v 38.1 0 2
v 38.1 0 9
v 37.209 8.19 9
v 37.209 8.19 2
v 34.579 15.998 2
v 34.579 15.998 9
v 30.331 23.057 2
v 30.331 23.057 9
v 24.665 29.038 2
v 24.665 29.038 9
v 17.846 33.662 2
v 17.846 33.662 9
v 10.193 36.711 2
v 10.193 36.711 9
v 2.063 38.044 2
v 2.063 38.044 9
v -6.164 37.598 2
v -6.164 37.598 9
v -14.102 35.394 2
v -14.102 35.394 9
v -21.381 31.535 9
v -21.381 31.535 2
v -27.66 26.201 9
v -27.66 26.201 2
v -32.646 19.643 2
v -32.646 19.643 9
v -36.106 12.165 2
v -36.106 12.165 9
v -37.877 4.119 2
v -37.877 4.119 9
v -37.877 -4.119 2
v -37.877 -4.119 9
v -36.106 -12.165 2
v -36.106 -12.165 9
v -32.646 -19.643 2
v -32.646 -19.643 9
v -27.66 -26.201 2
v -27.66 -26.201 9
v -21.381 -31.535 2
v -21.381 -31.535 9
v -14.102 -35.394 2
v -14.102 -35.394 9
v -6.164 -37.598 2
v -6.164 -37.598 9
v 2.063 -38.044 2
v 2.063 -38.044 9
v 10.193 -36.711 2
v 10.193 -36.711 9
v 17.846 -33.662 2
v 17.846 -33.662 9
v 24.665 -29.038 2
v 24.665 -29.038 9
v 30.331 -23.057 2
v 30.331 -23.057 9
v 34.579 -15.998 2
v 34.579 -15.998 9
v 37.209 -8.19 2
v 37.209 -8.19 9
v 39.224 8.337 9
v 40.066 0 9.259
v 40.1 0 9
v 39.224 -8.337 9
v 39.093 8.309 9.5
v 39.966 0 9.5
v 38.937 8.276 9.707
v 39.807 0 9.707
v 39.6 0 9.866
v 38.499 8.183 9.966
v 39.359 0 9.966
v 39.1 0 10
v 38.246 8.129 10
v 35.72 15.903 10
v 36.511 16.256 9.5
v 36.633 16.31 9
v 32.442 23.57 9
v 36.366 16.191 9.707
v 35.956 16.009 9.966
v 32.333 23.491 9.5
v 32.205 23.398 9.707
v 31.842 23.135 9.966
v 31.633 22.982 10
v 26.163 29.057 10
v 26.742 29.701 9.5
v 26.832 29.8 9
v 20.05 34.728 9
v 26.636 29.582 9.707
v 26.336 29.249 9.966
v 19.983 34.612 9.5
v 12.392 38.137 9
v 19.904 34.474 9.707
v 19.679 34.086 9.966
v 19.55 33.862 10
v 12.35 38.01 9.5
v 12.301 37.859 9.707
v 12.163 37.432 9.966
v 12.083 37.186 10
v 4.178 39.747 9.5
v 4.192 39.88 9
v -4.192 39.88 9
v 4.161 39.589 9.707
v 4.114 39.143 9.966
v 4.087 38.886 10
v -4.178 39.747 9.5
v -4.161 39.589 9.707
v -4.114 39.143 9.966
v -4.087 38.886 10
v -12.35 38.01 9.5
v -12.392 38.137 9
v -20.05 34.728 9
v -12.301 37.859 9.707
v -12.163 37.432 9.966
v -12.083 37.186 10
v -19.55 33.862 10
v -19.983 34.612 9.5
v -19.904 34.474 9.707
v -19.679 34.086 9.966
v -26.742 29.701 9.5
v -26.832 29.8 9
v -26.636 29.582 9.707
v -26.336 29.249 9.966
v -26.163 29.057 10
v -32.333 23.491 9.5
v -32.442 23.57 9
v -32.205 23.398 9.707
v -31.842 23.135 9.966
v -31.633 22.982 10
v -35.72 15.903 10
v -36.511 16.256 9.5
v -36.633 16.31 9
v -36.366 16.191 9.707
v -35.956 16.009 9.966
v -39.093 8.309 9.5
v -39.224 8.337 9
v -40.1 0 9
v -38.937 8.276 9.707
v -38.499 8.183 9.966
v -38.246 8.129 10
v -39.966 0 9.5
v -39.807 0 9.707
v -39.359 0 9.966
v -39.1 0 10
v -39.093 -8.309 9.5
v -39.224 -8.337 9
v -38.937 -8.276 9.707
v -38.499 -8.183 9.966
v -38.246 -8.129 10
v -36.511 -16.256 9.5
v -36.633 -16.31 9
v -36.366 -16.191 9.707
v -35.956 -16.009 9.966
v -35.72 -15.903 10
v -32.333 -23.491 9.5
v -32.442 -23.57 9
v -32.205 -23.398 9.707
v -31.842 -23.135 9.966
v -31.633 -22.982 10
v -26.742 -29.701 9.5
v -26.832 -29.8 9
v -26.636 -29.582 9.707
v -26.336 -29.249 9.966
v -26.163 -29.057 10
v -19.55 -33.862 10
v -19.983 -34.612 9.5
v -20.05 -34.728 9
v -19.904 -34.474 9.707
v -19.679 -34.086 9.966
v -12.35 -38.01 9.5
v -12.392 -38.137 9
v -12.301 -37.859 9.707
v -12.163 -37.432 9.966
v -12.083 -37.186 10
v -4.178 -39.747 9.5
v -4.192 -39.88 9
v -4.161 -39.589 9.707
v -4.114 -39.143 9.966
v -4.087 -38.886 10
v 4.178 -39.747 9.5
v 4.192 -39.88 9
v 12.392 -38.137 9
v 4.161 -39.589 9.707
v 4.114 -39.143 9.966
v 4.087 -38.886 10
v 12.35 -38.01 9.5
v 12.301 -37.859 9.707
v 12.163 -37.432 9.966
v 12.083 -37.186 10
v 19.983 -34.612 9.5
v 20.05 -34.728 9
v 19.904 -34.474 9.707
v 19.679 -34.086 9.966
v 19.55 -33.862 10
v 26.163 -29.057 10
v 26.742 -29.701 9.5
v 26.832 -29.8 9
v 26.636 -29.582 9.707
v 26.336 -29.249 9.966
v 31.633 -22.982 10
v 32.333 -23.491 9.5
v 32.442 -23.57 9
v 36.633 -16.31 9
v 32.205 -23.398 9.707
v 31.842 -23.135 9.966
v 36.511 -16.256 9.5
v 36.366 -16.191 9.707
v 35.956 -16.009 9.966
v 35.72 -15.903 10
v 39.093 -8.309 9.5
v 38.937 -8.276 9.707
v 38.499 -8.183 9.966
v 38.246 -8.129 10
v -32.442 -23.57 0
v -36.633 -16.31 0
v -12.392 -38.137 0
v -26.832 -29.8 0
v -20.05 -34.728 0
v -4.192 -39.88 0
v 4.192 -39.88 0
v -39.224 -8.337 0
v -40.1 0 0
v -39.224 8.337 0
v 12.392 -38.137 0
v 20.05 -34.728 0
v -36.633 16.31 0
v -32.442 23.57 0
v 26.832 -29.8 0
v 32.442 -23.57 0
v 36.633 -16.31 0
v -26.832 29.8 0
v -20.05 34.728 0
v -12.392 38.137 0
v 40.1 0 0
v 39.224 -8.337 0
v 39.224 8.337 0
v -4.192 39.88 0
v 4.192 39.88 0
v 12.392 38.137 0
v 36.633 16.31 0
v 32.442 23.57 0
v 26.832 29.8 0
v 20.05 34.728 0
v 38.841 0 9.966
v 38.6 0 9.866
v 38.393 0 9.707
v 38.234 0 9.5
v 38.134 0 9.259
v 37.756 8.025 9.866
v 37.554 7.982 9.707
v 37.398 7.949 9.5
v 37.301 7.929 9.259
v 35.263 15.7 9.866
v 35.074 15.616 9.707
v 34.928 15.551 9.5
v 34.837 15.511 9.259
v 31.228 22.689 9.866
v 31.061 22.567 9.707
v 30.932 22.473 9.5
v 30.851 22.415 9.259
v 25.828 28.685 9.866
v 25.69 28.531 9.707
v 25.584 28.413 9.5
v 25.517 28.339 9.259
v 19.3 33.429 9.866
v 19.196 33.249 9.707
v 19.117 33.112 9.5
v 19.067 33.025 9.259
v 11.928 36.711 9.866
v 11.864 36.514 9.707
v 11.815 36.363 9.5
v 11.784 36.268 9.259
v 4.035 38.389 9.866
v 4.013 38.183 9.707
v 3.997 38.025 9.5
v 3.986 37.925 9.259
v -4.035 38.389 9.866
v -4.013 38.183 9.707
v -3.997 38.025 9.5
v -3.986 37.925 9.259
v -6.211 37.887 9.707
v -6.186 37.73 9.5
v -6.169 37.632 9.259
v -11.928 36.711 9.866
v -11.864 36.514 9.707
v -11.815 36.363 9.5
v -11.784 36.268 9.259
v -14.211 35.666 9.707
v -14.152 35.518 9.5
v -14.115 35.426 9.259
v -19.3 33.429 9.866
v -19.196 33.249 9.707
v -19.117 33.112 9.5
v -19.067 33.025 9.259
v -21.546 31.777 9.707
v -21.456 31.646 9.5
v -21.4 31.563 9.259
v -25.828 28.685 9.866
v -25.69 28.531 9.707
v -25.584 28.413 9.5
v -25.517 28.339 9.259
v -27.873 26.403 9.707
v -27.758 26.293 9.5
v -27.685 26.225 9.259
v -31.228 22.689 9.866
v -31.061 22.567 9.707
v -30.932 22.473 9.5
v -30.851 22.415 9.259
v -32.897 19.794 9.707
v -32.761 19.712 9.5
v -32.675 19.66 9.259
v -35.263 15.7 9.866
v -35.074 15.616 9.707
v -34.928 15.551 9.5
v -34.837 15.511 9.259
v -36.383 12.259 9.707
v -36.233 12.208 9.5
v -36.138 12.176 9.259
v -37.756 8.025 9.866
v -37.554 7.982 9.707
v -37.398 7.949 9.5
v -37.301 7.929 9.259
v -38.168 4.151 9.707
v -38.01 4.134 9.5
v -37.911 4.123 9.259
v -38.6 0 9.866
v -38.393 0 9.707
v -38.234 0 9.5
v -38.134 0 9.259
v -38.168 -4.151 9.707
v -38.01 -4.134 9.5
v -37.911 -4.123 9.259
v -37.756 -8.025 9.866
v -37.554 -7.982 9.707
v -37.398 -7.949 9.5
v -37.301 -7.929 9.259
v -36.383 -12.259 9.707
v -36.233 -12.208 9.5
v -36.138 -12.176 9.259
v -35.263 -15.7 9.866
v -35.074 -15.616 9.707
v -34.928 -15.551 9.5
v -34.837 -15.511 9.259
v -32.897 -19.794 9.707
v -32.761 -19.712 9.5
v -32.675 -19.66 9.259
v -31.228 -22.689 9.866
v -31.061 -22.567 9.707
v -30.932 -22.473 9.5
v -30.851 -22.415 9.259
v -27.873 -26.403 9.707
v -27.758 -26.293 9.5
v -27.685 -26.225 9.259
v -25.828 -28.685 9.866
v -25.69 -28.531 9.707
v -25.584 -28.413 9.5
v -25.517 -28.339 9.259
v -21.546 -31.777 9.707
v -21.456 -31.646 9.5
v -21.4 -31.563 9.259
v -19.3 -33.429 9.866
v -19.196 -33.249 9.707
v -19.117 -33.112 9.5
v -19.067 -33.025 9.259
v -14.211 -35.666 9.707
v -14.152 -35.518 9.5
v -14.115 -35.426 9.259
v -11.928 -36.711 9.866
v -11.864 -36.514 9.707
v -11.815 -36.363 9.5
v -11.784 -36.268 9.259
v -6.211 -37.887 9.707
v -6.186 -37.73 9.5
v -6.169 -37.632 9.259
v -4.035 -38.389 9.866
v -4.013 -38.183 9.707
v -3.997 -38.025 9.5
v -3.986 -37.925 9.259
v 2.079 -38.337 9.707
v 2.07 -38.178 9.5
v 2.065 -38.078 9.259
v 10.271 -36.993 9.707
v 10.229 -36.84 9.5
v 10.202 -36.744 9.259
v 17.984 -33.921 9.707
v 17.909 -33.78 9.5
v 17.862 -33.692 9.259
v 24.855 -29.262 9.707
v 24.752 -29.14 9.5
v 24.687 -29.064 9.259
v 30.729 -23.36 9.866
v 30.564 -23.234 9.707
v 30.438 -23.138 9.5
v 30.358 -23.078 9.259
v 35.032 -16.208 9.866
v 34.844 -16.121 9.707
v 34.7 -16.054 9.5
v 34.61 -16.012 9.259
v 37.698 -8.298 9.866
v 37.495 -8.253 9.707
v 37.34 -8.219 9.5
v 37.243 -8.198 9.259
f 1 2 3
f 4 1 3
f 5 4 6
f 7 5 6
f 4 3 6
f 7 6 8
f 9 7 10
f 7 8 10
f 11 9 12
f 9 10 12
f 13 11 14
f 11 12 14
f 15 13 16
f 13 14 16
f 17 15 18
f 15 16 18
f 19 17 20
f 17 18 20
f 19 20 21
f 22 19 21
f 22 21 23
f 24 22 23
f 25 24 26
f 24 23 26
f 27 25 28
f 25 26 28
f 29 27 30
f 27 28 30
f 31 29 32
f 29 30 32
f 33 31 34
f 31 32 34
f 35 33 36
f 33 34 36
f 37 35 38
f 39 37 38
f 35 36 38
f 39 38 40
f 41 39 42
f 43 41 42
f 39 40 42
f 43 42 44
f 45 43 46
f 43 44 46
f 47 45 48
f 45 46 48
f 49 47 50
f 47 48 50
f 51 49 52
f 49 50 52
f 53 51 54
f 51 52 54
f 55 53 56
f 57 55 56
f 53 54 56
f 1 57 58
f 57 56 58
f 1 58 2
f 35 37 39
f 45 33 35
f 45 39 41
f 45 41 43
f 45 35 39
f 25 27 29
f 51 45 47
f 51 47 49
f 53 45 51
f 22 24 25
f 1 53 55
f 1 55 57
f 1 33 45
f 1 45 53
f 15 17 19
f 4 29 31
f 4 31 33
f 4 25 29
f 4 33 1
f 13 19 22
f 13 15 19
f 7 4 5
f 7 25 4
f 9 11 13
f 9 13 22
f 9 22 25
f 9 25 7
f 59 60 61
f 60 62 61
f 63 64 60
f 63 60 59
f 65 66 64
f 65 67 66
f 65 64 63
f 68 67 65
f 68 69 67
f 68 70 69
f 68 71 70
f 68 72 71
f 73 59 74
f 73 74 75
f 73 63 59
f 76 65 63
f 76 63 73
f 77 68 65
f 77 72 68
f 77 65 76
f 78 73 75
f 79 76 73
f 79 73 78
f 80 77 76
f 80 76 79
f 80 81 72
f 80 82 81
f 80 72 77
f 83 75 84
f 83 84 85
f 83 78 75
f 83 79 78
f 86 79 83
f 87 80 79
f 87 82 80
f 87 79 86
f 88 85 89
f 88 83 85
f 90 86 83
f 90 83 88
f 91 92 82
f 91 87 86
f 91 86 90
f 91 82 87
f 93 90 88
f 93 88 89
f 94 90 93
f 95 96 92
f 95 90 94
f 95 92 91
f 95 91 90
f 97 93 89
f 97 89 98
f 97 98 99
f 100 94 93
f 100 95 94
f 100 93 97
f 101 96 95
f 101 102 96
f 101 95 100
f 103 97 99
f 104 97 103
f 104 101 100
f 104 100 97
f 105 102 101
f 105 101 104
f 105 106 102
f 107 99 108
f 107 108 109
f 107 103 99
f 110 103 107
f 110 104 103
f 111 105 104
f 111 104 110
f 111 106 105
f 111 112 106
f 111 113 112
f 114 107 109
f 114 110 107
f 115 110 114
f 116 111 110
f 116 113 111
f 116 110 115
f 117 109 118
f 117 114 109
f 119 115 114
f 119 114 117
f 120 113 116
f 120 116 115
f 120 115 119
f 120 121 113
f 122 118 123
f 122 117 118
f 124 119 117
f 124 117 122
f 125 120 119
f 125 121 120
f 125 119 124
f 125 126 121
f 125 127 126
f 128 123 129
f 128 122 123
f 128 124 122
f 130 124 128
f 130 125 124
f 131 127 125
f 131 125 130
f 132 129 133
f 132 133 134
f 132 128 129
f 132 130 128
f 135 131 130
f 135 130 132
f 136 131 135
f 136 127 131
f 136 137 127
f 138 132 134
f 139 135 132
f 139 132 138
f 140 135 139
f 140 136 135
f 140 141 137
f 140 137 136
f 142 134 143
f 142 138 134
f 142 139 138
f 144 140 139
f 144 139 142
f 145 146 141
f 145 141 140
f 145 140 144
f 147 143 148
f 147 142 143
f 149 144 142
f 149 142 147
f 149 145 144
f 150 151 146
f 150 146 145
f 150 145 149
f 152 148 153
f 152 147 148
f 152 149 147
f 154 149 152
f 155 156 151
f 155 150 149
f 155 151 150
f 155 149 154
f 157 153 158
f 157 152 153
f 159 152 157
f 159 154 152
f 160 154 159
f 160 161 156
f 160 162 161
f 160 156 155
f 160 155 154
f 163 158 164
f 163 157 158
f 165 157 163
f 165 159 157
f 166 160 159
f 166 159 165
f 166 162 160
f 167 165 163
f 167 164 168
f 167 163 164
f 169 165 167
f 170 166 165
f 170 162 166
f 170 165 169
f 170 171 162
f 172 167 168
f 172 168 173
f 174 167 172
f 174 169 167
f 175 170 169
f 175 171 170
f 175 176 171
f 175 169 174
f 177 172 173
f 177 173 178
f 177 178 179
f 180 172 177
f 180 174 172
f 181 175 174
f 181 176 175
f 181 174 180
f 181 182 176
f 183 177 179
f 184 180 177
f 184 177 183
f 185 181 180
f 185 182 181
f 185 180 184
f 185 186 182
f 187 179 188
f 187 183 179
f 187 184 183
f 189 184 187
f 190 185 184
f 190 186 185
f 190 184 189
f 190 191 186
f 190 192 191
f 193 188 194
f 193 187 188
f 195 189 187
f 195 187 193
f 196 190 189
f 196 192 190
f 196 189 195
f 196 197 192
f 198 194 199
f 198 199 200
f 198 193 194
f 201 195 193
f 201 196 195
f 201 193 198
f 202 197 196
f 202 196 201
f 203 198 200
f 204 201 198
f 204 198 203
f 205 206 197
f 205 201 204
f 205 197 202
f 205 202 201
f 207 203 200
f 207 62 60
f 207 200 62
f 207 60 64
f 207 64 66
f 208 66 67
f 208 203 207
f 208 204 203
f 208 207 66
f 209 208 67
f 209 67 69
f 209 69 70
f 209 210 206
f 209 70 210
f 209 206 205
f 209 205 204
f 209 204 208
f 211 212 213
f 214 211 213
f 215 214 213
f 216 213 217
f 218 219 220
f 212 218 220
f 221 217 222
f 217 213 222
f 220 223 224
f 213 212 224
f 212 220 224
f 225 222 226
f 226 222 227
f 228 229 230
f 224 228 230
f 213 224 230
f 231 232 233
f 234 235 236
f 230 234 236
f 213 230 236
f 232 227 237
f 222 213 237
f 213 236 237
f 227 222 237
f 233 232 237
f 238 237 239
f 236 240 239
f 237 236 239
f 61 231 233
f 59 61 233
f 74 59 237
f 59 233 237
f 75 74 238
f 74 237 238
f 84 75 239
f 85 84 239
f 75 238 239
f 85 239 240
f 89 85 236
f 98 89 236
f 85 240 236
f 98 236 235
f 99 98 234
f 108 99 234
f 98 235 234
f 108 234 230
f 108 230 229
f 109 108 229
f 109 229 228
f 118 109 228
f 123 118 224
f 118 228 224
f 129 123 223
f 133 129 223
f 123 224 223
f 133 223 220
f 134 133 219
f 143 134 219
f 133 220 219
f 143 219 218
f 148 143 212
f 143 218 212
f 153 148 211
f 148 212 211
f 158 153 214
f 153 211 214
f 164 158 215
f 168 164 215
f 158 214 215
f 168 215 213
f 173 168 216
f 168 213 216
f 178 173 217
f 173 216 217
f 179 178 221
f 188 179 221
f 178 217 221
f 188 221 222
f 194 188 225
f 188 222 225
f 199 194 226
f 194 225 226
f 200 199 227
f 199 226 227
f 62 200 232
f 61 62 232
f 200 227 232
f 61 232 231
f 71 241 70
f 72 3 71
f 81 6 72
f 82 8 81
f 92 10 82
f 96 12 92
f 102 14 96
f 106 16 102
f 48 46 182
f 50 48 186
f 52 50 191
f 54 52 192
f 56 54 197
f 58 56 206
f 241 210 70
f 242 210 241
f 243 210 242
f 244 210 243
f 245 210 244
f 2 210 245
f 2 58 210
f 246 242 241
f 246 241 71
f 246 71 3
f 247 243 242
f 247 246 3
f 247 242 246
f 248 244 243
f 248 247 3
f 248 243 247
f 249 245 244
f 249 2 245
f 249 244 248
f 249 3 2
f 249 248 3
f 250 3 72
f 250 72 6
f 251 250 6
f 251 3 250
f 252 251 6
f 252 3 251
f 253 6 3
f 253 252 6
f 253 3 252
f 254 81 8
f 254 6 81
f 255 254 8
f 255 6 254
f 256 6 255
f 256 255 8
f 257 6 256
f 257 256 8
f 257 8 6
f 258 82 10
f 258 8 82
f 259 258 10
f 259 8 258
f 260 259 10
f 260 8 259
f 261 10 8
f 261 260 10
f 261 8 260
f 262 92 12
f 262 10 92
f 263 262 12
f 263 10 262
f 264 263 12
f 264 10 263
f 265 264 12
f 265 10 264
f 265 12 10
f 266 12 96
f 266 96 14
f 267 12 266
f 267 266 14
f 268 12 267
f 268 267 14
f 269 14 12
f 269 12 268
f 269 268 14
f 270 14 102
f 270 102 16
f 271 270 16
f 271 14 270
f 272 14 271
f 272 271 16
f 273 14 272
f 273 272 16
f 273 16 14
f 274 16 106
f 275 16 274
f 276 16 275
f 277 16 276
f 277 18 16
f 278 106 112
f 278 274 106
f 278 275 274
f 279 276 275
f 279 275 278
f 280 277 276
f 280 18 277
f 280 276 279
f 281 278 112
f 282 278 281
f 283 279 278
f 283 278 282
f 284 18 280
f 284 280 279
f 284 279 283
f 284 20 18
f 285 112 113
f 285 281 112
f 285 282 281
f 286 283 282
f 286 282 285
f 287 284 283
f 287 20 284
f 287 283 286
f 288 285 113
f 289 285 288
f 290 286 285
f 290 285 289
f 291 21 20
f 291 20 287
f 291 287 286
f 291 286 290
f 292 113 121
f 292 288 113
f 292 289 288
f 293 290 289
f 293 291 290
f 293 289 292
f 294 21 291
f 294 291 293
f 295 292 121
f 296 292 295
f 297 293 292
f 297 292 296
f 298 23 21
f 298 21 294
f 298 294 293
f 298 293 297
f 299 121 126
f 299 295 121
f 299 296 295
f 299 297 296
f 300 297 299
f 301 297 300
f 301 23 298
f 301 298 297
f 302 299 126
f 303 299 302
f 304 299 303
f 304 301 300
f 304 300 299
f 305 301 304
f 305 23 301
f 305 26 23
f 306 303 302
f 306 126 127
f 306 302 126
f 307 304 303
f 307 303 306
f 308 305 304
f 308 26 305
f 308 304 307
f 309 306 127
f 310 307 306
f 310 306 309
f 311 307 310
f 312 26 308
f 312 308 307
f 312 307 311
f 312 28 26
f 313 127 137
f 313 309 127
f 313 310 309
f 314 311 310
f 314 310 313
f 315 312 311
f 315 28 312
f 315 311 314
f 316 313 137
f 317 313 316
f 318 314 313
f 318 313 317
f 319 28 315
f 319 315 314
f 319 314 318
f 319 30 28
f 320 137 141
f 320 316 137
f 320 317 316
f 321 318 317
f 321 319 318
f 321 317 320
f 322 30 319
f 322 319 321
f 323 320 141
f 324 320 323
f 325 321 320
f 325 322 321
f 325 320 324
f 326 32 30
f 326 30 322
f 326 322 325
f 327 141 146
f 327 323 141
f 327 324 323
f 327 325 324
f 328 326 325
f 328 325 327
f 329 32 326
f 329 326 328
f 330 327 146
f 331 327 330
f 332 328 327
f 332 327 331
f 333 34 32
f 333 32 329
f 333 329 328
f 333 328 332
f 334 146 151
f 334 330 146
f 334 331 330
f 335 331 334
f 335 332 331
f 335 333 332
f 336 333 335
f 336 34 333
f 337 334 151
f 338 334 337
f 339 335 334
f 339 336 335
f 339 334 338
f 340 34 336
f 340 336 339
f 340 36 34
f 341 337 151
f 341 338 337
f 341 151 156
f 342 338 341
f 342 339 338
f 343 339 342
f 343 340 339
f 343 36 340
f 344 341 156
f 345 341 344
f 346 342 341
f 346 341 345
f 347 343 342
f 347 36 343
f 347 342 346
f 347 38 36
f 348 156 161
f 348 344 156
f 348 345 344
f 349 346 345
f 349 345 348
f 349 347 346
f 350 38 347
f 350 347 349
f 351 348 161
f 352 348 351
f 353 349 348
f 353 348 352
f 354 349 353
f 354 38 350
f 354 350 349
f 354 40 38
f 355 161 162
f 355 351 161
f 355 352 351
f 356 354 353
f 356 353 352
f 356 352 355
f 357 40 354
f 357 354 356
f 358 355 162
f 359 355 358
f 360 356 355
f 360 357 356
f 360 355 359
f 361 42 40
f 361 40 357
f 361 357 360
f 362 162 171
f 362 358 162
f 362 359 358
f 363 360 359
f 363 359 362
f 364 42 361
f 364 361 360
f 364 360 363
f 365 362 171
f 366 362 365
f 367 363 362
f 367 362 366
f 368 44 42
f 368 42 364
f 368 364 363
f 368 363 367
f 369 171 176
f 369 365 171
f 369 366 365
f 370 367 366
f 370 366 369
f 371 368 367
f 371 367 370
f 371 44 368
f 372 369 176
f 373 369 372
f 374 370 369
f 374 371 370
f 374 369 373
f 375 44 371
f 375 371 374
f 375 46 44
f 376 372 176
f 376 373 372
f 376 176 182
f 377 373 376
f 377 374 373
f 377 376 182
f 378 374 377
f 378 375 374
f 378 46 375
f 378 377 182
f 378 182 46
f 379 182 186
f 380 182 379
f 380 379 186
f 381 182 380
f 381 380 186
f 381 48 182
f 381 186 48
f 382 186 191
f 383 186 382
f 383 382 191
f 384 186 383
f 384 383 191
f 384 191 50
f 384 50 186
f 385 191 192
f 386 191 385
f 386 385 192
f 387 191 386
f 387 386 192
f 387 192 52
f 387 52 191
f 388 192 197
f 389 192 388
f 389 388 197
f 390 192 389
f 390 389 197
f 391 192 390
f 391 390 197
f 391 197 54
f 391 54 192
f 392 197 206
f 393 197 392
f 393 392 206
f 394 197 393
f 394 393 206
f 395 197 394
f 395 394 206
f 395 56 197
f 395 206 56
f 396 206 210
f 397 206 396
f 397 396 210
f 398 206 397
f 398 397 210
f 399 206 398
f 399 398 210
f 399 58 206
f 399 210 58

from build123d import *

# Parameters (mm, degrees)
F0_R     = 40.1
F1_DEPTH = 10
F2_R     = 38.1
F3_DEPTH = 8
F4_R     = 0.99999


# Not quite as in the source:
# - a fillet or chamfer is up to 0.001 mm smaller than in the source, because OpenCascade refuses the exact size


with BuildPart() as f1:
    # F0 (on Top) → F1 (new body)
    with BuildSketch(Plane.XY):
        Circle(F0_R)
    extrude(amount=F1_DEPTH)

    # F2 (on face) → F3 (cut)
    with BuildSketch(Plane.XY.offset(10)):
        Circle(F2_R)
    extrude(amount=-F3_DEPTH, mode=Mode.SUBTRACT)

    # F4 (radius 1 in the source; OpenCascade refuses exactly that, so slightly less here)
    f4_edges = [f1.edges().sort_by_distance(p)[0] for p in [
        (-38.1, 0, 10),
        (-40.1, 0, 10),
    ]]
    fillet(f4_edges, radius=F4_R)


solid = f1.part
